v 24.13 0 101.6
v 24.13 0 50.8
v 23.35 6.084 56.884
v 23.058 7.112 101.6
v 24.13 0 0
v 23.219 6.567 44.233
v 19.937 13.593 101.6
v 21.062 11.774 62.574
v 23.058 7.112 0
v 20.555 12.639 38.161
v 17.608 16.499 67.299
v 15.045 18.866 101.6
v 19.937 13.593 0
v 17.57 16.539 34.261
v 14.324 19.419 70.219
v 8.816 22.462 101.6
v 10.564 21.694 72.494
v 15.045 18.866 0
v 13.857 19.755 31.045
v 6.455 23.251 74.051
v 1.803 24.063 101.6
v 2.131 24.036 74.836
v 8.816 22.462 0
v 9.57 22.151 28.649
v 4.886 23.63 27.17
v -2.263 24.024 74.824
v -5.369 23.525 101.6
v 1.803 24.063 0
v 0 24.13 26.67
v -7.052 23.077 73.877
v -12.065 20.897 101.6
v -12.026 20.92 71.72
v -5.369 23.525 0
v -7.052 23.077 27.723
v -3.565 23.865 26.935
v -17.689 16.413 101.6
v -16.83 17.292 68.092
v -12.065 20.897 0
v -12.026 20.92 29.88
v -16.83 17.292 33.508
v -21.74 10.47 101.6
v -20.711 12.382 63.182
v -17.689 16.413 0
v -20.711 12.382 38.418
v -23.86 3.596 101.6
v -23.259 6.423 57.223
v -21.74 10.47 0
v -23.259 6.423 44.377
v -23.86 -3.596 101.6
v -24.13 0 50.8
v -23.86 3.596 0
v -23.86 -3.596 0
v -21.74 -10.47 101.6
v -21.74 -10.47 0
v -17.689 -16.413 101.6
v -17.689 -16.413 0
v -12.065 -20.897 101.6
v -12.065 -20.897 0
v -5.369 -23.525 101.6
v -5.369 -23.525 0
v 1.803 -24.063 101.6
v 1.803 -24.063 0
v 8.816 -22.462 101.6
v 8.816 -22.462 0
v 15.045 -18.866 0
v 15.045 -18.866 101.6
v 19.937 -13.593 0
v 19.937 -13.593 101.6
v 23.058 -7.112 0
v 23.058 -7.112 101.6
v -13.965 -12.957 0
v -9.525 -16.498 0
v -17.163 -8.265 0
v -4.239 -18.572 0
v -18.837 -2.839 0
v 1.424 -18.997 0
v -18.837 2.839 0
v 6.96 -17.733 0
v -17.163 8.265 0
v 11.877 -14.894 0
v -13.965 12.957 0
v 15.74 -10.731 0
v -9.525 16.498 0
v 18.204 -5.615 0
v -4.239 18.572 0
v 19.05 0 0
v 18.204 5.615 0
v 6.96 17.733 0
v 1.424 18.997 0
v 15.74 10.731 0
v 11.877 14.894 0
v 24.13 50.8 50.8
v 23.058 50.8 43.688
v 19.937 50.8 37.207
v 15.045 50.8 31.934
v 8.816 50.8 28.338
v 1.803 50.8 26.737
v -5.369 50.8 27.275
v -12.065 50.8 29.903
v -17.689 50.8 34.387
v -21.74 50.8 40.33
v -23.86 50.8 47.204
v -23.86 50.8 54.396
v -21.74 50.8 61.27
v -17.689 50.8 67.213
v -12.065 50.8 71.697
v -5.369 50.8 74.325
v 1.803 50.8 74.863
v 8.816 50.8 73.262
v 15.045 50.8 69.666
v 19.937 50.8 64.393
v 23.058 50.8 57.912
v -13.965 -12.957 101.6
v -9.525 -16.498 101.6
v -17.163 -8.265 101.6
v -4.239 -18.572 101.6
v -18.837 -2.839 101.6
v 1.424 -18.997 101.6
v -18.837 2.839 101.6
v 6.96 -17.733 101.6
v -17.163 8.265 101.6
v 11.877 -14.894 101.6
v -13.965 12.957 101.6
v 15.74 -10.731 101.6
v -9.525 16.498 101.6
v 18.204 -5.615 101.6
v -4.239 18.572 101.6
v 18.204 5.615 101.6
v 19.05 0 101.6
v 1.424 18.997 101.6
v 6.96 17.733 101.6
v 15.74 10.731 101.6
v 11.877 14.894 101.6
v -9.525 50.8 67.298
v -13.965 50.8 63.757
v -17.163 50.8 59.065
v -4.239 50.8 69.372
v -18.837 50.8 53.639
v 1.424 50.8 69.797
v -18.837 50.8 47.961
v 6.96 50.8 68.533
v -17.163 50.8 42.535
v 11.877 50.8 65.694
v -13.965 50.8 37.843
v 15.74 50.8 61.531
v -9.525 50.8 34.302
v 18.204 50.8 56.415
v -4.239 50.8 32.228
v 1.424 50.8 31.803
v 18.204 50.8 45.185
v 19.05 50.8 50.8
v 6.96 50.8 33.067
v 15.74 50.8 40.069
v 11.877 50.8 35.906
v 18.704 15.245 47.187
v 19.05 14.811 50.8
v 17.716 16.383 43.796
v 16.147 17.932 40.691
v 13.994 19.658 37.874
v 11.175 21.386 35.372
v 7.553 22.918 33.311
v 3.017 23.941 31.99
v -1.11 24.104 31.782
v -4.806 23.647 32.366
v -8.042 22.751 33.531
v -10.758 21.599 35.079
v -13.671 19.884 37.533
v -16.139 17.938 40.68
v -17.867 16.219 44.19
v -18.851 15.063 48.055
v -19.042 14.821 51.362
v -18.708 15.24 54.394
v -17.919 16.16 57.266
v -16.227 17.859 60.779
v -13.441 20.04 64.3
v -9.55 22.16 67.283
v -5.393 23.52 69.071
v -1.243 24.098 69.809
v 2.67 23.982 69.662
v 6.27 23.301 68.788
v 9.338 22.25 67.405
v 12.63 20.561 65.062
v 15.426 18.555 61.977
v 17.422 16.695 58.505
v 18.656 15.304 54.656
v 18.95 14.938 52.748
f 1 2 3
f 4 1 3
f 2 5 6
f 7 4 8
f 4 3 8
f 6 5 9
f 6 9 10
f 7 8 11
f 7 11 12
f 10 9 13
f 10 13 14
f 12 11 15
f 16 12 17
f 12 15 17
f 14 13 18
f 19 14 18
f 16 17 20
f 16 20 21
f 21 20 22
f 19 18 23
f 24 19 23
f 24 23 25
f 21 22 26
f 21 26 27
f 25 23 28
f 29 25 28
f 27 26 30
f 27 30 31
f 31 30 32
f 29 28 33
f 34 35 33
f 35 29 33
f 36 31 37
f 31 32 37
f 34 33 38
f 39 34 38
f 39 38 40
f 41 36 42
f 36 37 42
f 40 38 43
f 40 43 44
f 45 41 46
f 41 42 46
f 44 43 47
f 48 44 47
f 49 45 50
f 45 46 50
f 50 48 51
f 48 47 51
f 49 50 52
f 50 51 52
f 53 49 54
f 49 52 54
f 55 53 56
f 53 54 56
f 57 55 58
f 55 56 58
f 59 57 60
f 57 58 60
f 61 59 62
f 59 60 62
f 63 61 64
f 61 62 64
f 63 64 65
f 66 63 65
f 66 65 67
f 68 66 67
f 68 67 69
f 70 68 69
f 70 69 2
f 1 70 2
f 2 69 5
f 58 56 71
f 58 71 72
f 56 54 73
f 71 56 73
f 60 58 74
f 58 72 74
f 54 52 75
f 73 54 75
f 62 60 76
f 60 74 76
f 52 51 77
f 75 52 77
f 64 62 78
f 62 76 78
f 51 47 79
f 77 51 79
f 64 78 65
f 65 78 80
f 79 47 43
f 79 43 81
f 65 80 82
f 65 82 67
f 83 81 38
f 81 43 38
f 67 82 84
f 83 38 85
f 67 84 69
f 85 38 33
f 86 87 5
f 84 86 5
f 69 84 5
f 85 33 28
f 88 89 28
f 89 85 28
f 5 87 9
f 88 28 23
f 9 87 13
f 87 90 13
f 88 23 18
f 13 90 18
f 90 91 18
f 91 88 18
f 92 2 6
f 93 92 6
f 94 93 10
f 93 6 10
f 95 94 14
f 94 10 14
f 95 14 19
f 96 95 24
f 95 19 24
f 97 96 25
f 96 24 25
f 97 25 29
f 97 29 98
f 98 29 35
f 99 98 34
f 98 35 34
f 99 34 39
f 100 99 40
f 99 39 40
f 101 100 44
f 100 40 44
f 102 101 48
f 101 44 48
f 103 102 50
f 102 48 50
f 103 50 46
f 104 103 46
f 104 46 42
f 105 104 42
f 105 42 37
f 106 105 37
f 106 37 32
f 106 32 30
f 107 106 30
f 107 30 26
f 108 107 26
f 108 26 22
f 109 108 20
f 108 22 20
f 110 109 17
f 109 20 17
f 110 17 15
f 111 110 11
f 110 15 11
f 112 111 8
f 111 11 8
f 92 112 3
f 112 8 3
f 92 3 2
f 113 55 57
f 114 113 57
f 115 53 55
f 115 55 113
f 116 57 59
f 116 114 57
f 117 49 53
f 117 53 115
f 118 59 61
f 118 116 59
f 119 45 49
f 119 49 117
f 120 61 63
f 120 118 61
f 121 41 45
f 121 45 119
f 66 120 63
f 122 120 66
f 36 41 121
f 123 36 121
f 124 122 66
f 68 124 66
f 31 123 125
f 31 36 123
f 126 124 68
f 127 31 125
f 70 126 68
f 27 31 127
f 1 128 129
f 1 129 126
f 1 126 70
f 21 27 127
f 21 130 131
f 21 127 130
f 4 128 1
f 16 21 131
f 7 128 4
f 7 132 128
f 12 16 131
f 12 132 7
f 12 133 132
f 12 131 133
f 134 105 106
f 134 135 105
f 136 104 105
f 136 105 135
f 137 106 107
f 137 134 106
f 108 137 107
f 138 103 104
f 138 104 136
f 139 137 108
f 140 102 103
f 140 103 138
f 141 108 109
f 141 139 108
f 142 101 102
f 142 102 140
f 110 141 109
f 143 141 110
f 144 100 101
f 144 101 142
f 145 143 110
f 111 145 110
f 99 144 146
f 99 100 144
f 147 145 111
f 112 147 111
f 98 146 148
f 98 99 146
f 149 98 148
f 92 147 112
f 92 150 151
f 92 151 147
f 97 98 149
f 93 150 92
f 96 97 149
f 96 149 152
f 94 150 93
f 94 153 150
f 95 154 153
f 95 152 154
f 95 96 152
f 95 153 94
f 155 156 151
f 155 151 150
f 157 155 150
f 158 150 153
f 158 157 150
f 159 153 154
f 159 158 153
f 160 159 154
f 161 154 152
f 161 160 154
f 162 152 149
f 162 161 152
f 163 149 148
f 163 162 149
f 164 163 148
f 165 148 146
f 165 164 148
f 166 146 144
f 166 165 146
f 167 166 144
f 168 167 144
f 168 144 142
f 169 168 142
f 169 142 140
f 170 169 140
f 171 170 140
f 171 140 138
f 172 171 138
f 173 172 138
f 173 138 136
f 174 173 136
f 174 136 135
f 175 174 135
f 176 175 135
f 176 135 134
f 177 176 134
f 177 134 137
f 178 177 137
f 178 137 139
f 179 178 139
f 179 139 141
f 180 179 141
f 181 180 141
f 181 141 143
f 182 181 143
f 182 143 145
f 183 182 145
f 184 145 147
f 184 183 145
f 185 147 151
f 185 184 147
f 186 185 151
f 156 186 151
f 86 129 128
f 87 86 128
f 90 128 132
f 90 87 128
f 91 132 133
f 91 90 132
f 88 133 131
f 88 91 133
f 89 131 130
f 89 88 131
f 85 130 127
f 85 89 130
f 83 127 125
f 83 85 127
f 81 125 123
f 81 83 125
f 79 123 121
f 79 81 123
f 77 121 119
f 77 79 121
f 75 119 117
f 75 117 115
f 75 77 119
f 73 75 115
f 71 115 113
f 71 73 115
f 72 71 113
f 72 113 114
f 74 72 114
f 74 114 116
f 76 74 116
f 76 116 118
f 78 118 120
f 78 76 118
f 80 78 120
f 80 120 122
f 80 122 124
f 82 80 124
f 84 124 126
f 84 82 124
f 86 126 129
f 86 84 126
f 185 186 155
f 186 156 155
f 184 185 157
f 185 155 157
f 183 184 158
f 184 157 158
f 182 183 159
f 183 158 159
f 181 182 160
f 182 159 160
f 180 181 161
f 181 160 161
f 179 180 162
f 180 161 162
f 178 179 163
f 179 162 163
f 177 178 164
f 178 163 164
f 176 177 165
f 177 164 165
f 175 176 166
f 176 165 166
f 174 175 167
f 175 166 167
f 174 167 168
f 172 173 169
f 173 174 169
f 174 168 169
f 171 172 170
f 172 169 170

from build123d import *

# Parameters (mm, degrees)
SKETCH1_R           = 24.13
SKETCH1_R_2         = 19.05
BOSS_EXTRUDE1_DEPTH = 101.6
SKETCH2_R           = 24.13
SKETCH2_R_2         = 19.05
BOSS_EXTRUDE2_DEPTH = 50.8
SKETCH3_R           = 19.05
CUT_EXTRUDE1_DEPTH  = 102.6000001


with BuildPart() as part:
    # Sketch1 → Boss-Extrude1 (new body)
    with BuildSketch(Plane.XY):
        Circle(SKETCH1_R)
        Circle(SKETCH1_R_2, mode=Mode.SUBTRACT)
    extrude(amount=BOSS_EXTRUDE1_DEPTH)

    # Sketch2 → Boss-Extrude2 (add)
    with BuildSketch(Plane(origin=(0, 0, 0), x_dir=(1, 0, 0), z_dir=(0, 1, 0))):
        with Locations((0, -50.8)):
            Circle(SKETCH2_R)
        with Locations((0, -50.8)):
            Circle(SKETCH2_R_2, mode=Mode.SUBTRACT)
    extrude(amount=BOSS_EXTRUDE2_DEPTH)

    # Sketch3 → Cut-Extrude1 (cut, through all)
    with BuildSketch(Plane.XY.offset(101.6)):
        Circle(SKETCH3_R)
    extrude(amount=-CUT_EXTRUDE1_DEPTH, mode=Mode.SUBTRACT)


solid = part.part
